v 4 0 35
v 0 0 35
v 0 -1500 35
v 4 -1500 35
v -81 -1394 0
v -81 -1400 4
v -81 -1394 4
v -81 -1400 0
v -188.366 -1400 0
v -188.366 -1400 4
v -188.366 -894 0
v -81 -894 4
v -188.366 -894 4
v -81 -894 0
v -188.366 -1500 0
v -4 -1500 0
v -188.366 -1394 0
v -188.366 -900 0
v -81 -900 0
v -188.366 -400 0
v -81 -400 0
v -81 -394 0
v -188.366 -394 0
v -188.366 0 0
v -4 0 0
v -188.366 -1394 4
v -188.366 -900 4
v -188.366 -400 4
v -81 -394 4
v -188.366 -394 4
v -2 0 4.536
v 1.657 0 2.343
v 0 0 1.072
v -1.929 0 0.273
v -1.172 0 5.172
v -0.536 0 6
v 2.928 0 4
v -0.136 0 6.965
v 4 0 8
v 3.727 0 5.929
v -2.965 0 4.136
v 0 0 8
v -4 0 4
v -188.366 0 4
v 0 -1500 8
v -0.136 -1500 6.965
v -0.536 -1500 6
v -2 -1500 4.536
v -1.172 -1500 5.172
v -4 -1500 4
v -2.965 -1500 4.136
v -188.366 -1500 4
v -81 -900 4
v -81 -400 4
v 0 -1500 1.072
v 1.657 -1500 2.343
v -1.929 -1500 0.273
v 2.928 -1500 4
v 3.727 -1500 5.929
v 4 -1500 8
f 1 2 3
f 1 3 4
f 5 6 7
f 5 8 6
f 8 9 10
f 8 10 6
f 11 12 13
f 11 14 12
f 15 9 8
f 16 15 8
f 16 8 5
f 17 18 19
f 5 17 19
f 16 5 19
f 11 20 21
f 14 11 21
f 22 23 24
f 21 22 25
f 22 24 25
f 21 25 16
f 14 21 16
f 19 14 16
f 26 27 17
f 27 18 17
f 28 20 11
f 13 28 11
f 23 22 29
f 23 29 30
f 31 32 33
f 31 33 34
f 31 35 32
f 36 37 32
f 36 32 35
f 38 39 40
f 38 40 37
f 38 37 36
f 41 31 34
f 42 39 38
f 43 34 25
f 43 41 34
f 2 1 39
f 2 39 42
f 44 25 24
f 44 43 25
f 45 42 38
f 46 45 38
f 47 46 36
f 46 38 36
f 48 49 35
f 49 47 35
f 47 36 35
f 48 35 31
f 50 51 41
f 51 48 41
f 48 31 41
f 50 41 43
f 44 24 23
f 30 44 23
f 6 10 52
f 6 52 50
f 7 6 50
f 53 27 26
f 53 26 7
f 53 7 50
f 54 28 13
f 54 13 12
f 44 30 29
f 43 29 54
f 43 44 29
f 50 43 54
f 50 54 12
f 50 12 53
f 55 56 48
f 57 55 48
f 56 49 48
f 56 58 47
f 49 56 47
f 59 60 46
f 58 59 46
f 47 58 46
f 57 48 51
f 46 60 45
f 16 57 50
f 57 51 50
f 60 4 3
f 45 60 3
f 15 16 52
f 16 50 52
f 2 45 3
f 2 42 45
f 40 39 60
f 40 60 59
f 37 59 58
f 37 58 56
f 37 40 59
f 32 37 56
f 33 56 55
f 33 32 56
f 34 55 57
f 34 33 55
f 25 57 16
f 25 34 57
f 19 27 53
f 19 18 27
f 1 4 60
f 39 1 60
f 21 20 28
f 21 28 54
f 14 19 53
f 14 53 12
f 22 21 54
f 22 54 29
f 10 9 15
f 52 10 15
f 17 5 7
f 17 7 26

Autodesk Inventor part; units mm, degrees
ref_plane "YZ Plane" through (0, 0, 0) normal (1, 0, 0) x (0, 1, 0)
ref_plane "XZ Plane" through (0, 0, 0) normal (0, 1, 0) x (-1, 0, 0)
ref_plane "XY Plane" through (0, 0, 0) normal (0, 0, 1) x (1, 0, 0)
sketch "Sketch1" plane through (0, 0, 0) normal (0, 0, 1) x (1, 0, 0)
  line L0 (0, 0) -> (-188.3663, 0)
  line L1 (-188.3663, 0) -> (-188.3663, -1500)
  line L2 (-188.3663, -1500) -> (0, -1500)
  line L3 (0, -1500) -> (0, 0)
  line L4 (-188.3663, -1400) -> (-81, -1400)
  line L5 (-81, -1400) -> (-81, -1394)
  line L6 (-81, -1394) -> (-188.3663, -1394)
  line L7 (-188.3663, -1394) -> (-188.3663, -1400)
  line L8 (-188.3663, -900) -> (-81, -900)
  line L9 (-81, -900) -> (-81, -894)
  line L10 (-81, -894) -> (-188.3663, -894)
  line L11 (-188.3663, -894) -> (-188.3663, -900)
  line L12 (-188.3663, -400) -> (-81, -400)
  line L13 (-81, -400) -> (-81, -394)
  line L14 (-81, -394) -> (-188.3663, -394)
  line L15 (-188.3663, -394) -> (-188.3663, -400)
  dimension "d0" = 1500
  dimension "d1" = 188.3663
  dimension "d2" = 6
  dimension "d4" = 100
  dimension "d7" = 500
  dimension "d23" = 81
extrude "Plate1" add sketch "Sketch1" along normal blind 4 contours L3 L2 L1 L4 L5 L6 L8 L9 L10 L12 L13 L14 L0
sketch "Sketch2" plane through (4, 0, 0) normal (-1, 0, 0) x (0, -1, 0)
  line L0 (1500, 0) -> (0, 0)
  line L1 (0, 0) -> (0, 35)
  line L2 (0, 35) -> (1500, 35)
  line L3 (1500, 35) -> (1500, 0)
edge flange "Flange1" height 35 angle 90 thickness 4 bend radius 4 thickness toward (-1, 0, 0) relief tear relief width 4 relief depth 2 edges at (0, -750, 4) wall of the first edge with corners at (4, -1500, 0) (4, 0, 0) (4, 0, 35) (4, -1500, 35)
bend "Bend1"
corner "Corner1"
equation "\"d1\" = Stringer1_deep"
equation "\"d12\" = Thickness"
equation "\"d13\" = BendReliefWidth"
equation "\"d14\" = BendReliefDepth"
equation "\"d15\" = MinimumRemnant"
equation "\"d16\" = TransitionRadius"
equation "\"d19\" = BendRadius"
equation "\"d20\" = CornerReliefSize"
equation "\"d21\" = GapSize"
equation "\"d22\" = JacobiRadiusSize"
equation "\"BendRadius\" = Thickness"
equation "\"BendReliefWidth\" = Thickness"
equation "\"BendReliefDepth\" = 0.5 * Thickness"
equation "\"CornerReliefSize\" = 4 * Thickness"
equation "\"MinimumRemnant\" = 2 * Thickness"
equation "\"TransitionRadius\" = BendRadius"
equation "\"JacobiRadiusSize\" = BendRadius"
equation "\"GapSize\" = Thickness"
equation "\"Stringer1_deep\" = 188.36631"
equation "\"Thickness\" = 4"
properties part number "01.3 GBK stringer" material "Steel"
